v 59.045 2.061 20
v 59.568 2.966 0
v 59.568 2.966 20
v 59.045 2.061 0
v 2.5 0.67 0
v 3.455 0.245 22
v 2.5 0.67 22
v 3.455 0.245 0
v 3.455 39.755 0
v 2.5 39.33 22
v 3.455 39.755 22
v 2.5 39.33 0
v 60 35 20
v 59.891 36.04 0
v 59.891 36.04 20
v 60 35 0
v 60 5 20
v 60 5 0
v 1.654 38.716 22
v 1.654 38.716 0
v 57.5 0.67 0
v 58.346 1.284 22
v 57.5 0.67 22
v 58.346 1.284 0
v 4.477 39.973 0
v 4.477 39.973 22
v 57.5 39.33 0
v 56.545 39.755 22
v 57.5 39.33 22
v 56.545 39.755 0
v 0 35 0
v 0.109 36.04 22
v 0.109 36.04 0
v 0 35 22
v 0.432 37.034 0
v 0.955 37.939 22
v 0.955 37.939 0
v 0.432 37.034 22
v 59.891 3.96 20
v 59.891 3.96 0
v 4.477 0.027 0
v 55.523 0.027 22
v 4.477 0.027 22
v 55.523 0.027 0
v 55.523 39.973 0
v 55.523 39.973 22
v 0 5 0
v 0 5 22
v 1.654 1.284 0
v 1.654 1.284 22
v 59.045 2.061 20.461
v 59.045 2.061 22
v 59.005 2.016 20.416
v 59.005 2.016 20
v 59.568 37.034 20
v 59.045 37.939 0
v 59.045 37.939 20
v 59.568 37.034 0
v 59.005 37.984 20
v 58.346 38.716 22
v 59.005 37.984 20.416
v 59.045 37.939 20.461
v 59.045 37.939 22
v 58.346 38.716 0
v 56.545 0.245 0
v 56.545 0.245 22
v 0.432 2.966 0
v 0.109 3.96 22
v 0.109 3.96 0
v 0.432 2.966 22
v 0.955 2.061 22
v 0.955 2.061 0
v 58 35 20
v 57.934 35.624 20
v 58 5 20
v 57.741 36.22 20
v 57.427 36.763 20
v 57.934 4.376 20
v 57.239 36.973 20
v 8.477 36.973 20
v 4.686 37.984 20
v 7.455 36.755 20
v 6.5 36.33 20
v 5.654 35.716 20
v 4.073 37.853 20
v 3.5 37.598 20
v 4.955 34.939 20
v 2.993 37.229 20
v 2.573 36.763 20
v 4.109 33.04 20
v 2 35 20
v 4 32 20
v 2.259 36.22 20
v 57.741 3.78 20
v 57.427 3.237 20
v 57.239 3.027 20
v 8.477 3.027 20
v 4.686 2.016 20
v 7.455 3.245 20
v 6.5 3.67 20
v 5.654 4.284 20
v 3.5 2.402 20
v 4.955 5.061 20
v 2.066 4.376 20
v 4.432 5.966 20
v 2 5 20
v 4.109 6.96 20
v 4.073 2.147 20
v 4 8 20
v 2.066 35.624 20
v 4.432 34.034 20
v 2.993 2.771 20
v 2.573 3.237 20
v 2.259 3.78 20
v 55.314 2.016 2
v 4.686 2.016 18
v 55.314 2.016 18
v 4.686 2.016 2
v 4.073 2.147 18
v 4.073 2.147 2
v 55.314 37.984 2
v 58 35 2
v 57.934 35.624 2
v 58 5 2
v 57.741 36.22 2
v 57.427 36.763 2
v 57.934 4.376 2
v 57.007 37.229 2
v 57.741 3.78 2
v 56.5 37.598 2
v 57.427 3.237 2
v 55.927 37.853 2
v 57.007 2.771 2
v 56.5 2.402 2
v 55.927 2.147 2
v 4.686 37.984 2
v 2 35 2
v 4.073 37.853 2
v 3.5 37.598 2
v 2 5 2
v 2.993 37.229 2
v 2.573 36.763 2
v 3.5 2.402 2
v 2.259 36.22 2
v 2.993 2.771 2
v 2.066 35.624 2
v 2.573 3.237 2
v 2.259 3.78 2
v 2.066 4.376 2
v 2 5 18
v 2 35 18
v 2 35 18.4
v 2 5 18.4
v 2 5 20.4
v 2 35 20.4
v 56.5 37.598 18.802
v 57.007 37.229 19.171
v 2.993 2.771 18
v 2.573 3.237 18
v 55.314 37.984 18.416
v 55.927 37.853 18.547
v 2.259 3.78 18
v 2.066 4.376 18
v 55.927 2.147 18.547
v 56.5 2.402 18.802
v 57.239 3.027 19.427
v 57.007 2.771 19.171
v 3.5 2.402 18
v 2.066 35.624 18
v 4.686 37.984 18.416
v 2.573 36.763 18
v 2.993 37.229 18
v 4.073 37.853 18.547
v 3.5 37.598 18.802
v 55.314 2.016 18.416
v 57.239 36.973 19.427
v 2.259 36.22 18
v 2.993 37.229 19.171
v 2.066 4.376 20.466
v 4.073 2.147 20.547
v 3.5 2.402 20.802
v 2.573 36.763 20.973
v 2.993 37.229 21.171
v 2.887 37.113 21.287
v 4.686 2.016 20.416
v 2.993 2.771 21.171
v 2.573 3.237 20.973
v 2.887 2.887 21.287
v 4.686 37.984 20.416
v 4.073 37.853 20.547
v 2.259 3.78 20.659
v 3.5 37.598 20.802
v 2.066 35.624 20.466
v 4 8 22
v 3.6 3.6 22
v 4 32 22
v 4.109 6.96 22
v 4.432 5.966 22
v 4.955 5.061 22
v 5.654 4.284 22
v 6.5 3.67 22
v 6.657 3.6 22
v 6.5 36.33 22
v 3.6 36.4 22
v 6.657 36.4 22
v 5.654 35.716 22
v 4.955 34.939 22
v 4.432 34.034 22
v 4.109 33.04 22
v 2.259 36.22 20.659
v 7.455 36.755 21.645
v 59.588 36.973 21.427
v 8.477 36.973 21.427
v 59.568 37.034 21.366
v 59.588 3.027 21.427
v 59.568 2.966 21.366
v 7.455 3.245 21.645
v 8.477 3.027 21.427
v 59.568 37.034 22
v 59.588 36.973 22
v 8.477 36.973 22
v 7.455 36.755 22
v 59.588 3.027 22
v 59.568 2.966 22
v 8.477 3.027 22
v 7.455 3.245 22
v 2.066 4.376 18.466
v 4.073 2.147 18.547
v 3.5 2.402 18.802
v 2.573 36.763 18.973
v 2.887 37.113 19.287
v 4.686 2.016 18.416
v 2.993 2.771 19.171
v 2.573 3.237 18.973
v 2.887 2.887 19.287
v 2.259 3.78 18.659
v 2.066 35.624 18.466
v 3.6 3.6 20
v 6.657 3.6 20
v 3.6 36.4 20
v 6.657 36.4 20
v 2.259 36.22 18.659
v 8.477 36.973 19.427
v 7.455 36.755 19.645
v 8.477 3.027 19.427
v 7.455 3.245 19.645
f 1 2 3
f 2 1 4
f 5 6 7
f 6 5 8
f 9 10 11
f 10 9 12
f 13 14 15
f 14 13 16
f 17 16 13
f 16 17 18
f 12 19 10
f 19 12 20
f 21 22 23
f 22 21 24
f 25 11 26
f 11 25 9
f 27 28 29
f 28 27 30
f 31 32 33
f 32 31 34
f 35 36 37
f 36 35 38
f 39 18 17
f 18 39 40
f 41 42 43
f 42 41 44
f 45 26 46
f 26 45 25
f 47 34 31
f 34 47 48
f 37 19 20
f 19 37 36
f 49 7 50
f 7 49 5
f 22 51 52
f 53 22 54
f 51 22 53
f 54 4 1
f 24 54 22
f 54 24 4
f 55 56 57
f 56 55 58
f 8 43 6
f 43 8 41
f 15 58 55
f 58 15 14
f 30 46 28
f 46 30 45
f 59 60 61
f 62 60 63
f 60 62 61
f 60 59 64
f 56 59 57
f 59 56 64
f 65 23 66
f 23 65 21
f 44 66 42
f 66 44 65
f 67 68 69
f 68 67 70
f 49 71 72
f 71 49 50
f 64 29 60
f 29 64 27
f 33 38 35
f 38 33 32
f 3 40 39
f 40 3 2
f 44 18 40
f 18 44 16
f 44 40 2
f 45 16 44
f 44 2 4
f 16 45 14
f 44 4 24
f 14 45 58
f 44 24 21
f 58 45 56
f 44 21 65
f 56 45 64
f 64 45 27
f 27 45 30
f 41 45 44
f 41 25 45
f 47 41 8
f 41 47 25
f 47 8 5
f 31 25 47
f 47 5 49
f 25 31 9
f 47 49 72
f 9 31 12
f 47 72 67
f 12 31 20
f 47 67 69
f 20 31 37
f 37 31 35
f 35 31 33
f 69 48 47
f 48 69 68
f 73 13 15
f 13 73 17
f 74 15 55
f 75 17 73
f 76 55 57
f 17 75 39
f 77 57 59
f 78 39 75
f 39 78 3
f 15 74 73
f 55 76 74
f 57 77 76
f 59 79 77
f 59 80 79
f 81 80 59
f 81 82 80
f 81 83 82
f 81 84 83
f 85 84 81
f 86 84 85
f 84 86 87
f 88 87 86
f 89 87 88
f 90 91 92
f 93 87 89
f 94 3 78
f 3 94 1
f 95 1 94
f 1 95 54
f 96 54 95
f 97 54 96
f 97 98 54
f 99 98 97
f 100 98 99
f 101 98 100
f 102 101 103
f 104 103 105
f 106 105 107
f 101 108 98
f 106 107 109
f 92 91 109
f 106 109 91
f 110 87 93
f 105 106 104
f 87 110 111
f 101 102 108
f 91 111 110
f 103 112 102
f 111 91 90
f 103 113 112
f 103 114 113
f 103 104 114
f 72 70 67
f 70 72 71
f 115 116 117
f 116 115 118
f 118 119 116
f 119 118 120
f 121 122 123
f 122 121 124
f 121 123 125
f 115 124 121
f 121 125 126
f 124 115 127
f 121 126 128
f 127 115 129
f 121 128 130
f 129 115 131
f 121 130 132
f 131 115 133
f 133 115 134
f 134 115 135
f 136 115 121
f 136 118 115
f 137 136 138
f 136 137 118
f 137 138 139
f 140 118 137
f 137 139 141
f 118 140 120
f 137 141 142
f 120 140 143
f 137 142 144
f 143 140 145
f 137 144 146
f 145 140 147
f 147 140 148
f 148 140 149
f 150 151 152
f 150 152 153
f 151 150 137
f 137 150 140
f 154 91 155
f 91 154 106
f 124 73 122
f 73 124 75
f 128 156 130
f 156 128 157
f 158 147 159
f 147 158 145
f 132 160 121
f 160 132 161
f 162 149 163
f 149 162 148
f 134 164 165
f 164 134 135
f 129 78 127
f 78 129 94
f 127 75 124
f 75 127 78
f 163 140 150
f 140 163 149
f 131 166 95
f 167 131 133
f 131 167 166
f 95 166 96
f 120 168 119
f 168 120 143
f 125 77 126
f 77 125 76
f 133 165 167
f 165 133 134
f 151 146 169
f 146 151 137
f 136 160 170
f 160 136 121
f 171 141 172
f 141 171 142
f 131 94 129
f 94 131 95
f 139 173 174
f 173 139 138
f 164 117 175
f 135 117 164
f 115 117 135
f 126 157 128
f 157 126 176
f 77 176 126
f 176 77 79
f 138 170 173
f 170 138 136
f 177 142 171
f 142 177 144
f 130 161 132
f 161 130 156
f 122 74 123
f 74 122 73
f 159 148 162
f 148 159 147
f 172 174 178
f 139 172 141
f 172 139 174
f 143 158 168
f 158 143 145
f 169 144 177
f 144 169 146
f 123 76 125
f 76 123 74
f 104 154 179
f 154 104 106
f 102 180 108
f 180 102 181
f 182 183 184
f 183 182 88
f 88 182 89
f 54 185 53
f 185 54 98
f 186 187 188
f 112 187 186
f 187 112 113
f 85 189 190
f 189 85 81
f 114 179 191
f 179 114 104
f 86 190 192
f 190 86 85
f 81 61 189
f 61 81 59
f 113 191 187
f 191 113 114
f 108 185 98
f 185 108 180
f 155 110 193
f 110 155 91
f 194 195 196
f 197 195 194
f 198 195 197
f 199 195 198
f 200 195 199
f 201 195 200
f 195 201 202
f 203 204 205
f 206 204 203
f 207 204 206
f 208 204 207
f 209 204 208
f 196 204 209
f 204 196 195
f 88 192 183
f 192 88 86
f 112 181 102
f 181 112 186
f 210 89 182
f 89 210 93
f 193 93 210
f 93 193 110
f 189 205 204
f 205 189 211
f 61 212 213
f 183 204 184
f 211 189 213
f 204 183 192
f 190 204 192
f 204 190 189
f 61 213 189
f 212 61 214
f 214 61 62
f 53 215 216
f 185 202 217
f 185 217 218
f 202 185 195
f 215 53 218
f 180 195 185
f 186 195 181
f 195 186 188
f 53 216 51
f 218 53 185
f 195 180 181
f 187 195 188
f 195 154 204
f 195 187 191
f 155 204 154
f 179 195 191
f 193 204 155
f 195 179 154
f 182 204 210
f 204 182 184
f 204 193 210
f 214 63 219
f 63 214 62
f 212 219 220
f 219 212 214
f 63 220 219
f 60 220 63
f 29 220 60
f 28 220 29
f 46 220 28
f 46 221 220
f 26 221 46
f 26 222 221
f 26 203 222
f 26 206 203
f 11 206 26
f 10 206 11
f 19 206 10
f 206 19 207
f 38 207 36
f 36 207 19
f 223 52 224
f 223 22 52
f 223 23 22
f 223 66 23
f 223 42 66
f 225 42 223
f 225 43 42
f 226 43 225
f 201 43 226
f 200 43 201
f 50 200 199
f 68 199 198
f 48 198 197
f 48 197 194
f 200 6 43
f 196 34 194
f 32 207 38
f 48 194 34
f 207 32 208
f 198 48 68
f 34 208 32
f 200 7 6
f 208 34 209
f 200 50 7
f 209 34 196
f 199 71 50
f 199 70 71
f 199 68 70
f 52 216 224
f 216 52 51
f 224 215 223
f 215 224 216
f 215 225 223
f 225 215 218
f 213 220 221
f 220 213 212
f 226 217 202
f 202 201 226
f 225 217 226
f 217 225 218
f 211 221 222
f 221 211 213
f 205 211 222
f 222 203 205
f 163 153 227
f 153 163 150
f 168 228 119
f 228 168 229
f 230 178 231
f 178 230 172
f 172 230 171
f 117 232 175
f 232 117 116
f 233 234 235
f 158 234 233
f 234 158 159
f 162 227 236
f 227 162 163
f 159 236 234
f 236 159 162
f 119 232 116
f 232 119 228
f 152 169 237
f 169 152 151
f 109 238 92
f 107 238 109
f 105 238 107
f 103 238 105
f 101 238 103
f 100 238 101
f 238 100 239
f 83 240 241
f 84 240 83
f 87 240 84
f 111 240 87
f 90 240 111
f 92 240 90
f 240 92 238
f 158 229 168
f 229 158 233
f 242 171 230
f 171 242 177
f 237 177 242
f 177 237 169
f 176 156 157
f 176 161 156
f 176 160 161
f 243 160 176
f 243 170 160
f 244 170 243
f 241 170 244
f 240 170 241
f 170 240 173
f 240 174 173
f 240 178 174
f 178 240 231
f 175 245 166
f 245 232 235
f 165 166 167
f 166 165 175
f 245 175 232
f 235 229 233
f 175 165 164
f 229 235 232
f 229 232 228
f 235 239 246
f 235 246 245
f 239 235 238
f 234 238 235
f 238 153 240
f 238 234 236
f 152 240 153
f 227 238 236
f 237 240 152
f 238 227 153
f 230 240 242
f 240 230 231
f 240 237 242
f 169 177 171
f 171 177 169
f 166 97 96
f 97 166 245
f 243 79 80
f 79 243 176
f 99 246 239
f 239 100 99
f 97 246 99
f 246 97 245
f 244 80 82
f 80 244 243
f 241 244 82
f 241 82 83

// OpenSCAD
itemsShown="box"; // [both,box,lid]
boxLength=60;
boxWidth=40;
boxHeight=22;
cornerRadius=5;
wallThickness=2;
bottomThickness=2;
lidThickness=2;
lidClearance=0.2;
lidEdgeThickness=0.5;
// Notch in the lid
withNotch=true;//true;//[true:false]

/* [Global] */
if (itemsShown=="box") showBox();
if (itemsShown=="lid") showLid();
if (itemsShown=="both"){showBox();showLid();}

module showLid(){
	translate ([0, -2*wallThickness, 0]) 
	roundBoxLid(l=boxLength-wallThickness,
				w=boxWidth-2*wallThickness-lidClearance,
				h=lidThickness,
				et=lidEdgeThickness,
				r=cornerRadius-wallThickness,
				notch=withNotch);
}

module showBox(){
	round_box(l=boxLength,
			  w=boxWidth,
			  h=boxHeight,
			  bt=bottomThickness,
			  wt=wallThickness,
			  lt=lidThickness,
			  r=cornerRadius);
}

module round_box(l=40,w=30,h=30,bt=2,wt=2,lt=2,r=5){
	difference() { 
		round_cube(l=l,w=w,h=h-lt,r=r);
		translate ([wt, wt, bt]) 
		round_cube(l=l-wt*2,w=w-wt*2,h=h,r=r-wt);
	}
	//use two box rims. one to make a slope to support the lid
	roundBoxRim();
	translate ([0, 0, -wt]) roundBoxRim();
}

module roundBoxRim(l=boxLength,
				   w=boxWidth,
				   h=boxHeight,
				   et=lidEdgeThickness,
				   r=cornerRadius,
				   wt=wallThickness,
				   lt=lidThickness){
	difference() { 
		translate ([0, 0, h-lt]) 
		round_cube(l=l,w=w,h=lt,r=r);
		translate ([wt+lt,wt+lt-et*2,h-lt-0.1]) 
		round_cube(l=l*2,w=w-2*(wt+lt)+4*et,h=lt+0.2,r=r-wt+lt);

		//subtract out a lid to make the ledge
		translate ([wt, w-wt, h-lt-0.1])
		roundBoxLid(l=l*2,w=w-2*wt,h=lt+0.1,wt=wt,t=lt,et=0.5,r=r-wt,notch=false);
	}
}

module roundBoxLid(l=40,w=30,h=3,wt=2,t=2,et=0.5,r=5,notch=true){
	translate ([l, 0, 0]) 
	rotate (a = [0, 0, 180]) 
	difference(){
		round_cube(l=l,w=w,h=h,r=r);

		translate ([-1, 0, et]) rotate (a = [45, 0, 0])  cube (size = [l+2, h*2, h*2]); 
		translate ([-1, w, et]) rotate (a = [45, 0, 0])  cube (size = [l+2, h*2, h*2]); 
		translate ([l, -1, et]) rotate (a = [45, 0, 90]) cube (size = [w+2, h*2, h*2]); 
		if (notch==true){
			translate([2,w/2,h+0.001]) thumbNotch(10/2,72,t);
		}
	}
}

module thumbNotch(
	thumbR=12/2,
	angle=72,
	notchHeight=2){

	size=10*thumbR;

	rotate([0,0,90])
	difference(){
		translate([0,
					(thumbR*sin(angle)-notchHeight)/tan(angle),
					 thumbR*sin(angle)-notchHeight])
		rotate([angle,0,0])
		cylinder(r=thumbR,h=size,$fn=30);

		translate([-size,-size,0])
		cube(size*2);
	}
}

module round_cube(l=40,w=30,h=20,r=5,$fn=30){
	hull(){ 
		translate ([r, r, 0]) cylinder (h = h, r=r);
		translate ([r, w-r, 0]) cylinder (h = h, r=r);
		translate ([l-r,w-r, 0]) cylinder (h = h, r=r);
		translate ([l-r, r, 0]) cylinder (h = h, r=r);
	}
}
